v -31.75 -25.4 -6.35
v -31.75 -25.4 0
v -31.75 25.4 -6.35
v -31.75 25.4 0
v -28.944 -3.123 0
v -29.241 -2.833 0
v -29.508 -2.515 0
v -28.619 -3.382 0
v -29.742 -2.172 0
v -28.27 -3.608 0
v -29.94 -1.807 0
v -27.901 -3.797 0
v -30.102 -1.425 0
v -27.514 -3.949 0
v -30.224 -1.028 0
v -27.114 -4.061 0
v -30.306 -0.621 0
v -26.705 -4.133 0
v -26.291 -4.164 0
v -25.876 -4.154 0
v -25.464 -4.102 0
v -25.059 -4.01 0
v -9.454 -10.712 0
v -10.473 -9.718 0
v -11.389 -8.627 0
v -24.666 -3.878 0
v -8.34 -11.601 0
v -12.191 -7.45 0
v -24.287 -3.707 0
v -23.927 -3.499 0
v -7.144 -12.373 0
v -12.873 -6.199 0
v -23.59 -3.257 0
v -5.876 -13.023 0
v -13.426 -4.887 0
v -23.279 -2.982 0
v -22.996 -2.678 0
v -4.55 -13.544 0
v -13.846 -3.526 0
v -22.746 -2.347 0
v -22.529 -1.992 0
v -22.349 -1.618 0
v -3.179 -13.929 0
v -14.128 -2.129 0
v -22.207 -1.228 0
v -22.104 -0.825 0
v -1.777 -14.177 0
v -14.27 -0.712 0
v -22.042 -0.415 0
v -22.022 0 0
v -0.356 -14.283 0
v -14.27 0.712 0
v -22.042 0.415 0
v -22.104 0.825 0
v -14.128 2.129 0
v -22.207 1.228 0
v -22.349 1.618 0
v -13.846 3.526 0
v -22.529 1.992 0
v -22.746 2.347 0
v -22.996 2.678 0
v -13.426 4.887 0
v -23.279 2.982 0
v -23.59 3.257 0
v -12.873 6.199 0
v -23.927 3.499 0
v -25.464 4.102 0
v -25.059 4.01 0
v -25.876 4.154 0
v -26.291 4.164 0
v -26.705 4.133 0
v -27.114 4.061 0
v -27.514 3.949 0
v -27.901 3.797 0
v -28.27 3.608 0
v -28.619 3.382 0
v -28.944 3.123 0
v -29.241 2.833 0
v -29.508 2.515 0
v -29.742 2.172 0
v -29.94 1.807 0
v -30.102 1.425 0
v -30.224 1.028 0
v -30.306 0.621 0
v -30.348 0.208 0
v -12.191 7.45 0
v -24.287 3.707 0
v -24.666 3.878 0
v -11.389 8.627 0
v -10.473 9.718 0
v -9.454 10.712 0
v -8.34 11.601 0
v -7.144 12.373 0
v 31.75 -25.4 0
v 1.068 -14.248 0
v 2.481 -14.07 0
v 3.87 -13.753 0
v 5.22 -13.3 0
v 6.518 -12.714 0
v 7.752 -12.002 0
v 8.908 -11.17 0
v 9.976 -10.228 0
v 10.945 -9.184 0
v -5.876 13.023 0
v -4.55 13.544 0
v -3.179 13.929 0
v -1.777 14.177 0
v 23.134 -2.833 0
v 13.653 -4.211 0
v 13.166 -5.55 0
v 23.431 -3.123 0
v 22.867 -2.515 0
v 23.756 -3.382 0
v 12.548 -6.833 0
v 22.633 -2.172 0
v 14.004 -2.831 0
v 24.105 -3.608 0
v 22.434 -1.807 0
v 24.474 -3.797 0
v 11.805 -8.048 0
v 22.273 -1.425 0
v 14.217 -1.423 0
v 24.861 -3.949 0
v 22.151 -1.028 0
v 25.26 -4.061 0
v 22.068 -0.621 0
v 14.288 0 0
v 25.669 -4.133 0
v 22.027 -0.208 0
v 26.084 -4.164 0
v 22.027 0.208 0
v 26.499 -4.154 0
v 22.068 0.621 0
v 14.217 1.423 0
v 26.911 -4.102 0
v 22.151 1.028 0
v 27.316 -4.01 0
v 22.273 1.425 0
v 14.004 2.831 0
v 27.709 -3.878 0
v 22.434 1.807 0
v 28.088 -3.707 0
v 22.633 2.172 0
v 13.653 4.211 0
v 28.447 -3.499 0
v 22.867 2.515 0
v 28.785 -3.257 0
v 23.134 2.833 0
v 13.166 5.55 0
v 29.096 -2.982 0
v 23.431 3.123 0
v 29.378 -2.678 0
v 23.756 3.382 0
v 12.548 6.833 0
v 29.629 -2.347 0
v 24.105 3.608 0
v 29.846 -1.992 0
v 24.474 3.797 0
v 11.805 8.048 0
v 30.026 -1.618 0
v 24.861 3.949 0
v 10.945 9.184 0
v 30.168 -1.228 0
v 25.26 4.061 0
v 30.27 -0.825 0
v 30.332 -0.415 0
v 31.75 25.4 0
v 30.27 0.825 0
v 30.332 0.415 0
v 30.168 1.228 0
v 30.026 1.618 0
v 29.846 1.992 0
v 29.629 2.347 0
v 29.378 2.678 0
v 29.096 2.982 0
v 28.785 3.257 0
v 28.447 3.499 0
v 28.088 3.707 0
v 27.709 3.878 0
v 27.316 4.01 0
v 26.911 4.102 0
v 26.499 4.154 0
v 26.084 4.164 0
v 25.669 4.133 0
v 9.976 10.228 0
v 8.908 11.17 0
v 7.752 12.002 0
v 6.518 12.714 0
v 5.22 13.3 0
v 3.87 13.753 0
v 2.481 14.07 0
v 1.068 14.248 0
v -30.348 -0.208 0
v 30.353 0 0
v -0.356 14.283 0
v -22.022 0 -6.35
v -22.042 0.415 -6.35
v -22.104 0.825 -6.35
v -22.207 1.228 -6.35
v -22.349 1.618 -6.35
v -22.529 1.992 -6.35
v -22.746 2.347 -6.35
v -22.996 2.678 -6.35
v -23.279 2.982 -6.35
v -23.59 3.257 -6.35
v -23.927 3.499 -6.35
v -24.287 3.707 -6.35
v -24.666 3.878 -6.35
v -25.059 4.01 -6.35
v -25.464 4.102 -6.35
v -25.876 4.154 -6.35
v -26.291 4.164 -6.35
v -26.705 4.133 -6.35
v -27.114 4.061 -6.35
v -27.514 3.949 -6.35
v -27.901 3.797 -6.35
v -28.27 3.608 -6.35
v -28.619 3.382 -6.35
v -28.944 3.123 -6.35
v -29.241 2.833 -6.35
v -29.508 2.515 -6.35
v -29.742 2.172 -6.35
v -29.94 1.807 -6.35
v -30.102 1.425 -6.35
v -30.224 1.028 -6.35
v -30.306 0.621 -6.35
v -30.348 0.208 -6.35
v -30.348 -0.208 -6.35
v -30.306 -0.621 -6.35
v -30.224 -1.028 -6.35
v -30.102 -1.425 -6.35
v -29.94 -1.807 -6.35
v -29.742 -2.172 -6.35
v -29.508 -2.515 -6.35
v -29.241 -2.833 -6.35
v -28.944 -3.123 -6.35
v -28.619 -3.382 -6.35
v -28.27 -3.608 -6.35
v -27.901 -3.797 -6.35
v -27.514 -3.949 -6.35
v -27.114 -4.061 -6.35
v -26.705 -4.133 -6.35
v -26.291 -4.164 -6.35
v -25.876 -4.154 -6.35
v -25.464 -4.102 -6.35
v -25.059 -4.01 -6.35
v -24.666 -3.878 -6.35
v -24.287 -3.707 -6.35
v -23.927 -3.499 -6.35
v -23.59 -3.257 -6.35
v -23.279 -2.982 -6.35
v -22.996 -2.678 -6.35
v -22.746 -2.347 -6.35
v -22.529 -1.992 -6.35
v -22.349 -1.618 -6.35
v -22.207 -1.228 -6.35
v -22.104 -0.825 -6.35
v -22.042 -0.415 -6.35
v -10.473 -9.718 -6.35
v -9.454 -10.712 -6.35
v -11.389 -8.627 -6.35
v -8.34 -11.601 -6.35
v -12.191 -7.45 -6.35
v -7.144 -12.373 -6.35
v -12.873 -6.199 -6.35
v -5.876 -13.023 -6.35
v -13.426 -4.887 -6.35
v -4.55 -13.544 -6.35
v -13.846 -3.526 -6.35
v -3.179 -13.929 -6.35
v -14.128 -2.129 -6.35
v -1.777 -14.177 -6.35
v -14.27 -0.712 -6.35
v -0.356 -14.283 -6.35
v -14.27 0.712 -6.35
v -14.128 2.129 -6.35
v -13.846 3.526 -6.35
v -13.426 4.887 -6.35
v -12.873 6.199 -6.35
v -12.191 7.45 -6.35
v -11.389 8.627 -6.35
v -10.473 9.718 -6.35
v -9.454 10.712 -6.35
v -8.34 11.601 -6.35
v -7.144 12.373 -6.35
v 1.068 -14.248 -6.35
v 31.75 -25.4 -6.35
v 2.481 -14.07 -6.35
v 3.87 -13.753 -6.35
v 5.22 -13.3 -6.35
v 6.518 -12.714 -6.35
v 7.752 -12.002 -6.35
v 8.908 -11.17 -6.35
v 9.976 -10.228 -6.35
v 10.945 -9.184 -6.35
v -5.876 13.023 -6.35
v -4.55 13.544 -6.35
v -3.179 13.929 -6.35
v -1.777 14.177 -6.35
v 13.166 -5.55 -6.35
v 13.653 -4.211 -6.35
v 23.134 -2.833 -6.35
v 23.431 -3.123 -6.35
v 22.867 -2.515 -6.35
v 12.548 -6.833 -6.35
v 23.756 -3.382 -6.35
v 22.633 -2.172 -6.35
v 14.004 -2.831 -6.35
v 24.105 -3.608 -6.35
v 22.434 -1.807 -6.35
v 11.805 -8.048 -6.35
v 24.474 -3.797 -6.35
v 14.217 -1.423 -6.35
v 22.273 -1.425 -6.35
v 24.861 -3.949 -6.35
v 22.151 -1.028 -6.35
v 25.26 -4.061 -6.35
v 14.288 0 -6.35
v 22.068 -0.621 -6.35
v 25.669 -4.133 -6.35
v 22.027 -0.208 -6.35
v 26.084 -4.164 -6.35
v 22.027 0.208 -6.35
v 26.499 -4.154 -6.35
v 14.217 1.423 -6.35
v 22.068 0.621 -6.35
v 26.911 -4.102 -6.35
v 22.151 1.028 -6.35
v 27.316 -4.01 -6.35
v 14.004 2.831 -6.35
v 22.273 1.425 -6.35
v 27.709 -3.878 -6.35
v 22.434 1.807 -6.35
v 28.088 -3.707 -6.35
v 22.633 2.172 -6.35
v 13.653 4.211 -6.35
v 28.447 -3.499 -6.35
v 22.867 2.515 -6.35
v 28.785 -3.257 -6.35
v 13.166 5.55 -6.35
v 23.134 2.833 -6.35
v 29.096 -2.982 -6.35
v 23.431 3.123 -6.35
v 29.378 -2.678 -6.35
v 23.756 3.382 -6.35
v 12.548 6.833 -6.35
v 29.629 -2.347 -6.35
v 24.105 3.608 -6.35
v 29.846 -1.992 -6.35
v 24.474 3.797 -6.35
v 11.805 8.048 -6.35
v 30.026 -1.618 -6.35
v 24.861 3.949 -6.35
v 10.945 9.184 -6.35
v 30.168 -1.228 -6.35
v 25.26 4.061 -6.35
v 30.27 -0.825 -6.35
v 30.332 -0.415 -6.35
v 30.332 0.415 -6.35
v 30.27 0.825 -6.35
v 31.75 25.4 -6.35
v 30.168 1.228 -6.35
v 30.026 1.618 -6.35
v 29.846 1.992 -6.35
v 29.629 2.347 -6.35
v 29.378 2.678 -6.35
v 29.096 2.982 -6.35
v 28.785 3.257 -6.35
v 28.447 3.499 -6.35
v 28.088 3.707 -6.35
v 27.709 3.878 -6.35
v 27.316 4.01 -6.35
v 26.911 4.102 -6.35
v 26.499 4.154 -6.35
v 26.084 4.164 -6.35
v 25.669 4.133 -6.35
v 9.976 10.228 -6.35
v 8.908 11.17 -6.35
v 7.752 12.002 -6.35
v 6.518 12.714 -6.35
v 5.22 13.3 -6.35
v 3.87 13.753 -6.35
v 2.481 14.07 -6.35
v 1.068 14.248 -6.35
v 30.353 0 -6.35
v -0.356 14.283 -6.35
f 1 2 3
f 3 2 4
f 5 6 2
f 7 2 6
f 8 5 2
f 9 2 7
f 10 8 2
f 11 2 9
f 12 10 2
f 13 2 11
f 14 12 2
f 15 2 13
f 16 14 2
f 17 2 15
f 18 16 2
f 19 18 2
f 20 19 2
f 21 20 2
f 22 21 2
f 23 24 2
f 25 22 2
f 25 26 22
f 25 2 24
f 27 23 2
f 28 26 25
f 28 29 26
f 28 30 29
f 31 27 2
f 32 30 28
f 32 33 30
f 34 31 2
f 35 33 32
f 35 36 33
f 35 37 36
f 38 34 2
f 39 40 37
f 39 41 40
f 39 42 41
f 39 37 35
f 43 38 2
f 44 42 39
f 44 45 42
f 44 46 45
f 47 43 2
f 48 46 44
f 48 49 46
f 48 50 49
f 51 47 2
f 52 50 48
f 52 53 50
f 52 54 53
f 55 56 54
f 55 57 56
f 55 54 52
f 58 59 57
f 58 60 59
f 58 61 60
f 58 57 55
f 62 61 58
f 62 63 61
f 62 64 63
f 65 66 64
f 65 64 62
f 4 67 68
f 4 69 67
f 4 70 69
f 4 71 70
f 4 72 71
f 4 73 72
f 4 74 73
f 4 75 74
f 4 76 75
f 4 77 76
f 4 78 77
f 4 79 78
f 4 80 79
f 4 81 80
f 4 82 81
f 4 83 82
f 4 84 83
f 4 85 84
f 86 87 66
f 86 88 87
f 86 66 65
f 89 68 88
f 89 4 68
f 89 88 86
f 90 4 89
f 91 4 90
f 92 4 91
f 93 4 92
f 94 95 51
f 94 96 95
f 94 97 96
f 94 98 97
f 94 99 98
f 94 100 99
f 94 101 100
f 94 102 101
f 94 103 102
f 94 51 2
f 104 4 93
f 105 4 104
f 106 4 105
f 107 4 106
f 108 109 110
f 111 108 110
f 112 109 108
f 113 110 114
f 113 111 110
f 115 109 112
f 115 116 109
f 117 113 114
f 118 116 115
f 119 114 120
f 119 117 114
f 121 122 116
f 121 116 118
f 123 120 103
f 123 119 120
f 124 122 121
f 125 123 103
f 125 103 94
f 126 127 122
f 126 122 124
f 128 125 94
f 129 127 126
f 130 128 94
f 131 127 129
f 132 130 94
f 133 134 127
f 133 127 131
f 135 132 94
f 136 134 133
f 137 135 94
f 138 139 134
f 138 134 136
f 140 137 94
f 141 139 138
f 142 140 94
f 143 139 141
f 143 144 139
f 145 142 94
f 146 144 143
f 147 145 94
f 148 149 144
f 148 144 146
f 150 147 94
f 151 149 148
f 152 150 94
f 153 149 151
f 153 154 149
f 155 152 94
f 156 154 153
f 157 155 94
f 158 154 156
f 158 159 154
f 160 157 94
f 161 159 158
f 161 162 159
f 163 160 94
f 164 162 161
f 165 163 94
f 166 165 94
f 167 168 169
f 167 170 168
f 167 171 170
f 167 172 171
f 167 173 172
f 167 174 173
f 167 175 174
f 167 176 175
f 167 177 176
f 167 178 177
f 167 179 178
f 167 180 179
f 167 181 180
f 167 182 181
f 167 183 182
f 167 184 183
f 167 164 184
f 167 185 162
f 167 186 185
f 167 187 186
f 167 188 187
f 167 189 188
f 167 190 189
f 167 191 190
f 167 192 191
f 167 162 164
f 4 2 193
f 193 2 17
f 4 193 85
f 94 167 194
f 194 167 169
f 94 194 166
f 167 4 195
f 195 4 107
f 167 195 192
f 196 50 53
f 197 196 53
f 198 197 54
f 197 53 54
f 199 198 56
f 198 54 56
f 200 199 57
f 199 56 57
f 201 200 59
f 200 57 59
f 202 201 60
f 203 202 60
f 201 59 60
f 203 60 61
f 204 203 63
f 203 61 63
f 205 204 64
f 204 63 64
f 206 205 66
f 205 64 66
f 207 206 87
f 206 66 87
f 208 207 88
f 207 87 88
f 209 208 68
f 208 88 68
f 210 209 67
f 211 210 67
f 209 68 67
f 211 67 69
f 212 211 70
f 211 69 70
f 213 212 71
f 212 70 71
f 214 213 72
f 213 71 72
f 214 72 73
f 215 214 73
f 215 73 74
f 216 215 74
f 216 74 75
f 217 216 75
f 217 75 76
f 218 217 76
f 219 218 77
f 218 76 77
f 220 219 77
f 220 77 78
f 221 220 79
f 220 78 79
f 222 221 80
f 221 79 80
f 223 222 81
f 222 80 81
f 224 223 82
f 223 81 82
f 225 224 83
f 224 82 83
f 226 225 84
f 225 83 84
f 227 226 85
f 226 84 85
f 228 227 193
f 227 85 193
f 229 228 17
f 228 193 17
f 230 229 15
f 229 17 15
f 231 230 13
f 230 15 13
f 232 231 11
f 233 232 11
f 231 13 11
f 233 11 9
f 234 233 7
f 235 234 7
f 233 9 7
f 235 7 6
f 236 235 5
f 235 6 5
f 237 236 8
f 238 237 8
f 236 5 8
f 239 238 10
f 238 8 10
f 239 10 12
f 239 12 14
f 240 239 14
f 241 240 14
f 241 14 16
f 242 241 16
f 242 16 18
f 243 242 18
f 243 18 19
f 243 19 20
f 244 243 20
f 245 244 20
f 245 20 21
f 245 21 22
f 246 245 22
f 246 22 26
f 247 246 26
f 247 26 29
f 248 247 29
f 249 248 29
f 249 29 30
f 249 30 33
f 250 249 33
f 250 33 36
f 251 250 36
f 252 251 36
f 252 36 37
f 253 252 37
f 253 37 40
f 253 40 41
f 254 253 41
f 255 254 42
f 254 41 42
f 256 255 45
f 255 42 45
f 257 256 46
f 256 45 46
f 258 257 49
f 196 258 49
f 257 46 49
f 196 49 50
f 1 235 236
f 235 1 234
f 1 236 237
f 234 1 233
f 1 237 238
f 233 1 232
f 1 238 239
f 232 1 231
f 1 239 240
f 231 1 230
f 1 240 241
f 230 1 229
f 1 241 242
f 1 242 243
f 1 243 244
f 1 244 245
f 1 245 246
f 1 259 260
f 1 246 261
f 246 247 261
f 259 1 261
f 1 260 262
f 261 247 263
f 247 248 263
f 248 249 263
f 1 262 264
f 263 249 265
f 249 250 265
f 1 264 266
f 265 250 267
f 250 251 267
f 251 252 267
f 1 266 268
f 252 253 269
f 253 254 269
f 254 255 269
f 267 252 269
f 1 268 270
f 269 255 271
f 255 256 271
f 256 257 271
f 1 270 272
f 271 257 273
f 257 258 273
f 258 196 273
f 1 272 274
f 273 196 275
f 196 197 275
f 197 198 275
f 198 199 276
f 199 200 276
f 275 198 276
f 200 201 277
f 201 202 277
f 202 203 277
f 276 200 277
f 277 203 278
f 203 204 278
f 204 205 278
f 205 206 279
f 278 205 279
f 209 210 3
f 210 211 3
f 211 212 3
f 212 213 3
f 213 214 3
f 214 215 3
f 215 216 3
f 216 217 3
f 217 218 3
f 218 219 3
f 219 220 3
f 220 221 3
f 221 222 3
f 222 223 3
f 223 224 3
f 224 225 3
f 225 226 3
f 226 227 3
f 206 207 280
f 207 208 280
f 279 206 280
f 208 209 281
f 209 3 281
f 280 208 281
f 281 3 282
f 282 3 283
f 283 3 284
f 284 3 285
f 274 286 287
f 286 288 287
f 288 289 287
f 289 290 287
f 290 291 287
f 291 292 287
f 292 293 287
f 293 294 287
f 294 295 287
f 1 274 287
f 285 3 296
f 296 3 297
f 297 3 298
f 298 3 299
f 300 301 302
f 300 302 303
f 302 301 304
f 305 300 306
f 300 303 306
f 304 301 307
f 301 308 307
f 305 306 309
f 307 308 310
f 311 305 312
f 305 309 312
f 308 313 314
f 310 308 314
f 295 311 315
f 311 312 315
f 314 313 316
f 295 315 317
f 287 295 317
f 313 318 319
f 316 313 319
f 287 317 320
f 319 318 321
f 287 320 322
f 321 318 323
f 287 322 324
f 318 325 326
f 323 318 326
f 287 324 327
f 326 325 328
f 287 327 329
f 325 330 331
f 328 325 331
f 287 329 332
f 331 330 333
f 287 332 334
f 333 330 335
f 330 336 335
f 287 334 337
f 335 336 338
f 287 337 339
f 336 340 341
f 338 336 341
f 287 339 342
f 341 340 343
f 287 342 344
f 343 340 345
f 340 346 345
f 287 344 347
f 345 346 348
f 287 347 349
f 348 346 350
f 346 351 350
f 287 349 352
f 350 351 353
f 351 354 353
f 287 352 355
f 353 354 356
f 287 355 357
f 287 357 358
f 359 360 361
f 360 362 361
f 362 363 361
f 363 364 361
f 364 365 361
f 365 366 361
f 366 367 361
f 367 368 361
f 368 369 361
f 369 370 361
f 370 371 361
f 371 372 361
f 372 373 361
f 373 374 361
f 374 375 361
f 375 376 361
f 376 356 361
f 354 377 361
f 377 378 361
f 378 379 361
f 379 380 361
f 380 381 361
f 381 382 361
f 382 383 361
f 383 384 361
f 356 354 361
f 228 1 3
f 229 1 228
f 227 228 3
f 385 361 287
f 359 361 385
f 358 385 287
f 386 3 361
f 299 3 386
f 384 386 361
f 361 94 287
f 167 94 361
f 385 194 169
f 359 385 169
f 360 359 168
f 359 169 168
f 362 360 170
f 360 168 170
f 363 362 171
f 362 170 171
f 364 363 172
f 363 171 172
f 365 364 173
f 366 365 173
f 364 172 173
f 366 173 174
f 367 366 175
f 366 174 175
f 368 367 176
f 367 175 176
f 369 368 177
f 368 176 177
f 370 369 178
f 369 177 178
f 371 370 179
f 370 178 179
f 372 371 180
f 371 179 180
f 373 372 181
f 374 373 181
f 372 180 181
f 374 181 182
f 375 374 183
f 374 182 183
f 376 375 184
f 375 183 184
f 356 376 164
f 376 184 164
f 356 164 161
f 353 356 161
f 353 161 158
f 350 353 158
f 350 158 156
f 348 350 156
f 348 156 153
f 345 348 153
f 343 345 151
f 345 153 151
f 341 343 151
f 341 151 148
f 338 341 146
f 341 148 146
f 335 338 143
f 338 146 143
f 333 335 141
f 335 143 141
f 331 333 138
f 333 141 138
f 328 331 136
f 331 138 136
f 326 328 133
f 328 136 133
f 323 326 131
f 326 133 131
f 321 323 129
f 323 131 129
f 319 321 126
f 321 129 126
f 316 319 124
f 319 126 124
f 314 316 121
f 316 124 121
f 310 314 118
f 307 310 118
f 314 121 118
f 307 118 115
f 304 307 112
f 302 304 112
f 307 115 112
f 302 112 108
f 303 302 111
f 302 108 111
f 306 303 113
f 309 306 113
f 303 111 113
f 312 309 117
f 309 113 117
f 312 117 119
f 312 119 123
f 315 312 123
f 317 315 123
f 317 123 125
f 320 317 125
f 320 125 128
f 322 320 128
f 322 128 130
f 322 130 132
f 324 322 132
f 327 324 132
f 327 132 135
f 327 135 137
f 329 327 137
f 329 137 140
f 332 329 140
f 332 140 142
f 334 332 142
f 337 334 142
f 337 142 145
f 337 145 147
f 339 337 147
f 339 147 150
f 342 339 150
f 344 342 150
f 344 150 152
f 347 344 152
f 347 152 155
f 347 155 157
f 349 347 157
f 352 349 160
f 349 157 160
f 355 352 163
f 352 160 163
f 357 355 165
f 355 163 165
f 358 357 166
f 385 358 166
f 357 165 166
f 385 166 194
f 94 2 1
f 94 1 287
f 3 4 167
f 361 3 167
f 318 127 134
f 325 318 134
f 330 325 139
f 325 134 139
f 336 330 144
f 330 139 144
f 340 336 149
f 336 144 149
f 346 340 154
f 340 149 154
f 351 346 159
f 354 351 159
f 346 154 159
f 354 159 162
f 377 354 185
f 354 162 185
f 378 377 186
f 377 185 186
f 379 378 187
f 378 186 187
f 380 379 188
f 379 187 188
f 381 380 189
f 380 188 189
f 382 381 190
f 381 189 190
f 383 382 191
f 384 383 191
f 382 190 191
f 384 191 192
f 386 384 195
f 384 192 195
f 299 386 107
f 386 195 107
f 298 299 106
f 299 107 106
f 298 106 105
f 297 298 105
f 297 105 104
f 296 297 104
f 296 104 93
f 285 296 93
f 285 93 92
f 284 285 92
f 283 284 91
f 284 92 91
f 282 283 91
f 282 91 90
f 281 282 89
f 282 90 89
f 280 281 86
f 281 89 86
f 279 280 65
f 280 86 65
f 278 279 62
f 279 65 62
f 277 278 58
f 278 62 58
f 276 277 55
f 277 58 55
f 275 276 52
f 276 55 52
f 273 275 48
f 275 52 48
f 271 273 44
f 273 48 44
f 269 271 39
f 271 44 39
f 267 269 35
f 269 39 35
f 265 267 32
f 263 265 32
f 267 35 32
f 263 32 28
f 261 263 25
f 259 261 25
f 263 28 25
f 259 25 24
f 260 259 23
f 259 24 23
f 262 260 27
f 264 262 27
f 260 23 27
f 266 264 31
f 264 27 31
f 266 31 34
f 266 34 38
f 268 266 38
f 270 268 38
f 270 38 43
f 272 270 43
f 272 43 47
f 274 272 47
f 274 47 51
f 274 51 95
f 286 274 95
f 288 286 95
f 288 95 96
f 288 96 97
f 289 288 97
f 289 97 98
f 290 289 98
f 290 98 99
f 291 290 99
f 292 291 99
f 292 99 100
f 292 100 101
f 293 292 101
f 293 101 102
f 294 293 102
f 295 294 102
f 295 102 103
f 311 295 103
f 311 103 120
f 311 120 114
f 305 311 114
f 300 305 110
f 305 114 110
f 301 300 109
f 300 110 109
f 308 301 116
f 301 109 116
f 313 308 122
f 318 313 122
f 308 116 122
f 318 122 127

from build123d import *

# Parameters (mm, degrees)
F0_W     = 63.5
F0_H     = 50.8
F0_R     = 4.1656
F0_R_2   = 14.2875
F1_DEPTH = 6.35


with BuildPart() as f1:
    # F0 (on Top) → F1 (new body)
    with BuildSketch(Plane.XY):
        Rectangle(F0_W, F0_H)
        with Locations((-26.1874, 0)):
            Circle(F0_R, mode=Mode.SUBTRACT)
        Circle(F0_R_2, mode=Mode.SUBTRACT)
        with Locations((26.1874, 0)):
            Circle(F0_R, mode=Mode.SUBTRACT)
    extrude(amount=-F1_DEPTH)


solid = f1.part
